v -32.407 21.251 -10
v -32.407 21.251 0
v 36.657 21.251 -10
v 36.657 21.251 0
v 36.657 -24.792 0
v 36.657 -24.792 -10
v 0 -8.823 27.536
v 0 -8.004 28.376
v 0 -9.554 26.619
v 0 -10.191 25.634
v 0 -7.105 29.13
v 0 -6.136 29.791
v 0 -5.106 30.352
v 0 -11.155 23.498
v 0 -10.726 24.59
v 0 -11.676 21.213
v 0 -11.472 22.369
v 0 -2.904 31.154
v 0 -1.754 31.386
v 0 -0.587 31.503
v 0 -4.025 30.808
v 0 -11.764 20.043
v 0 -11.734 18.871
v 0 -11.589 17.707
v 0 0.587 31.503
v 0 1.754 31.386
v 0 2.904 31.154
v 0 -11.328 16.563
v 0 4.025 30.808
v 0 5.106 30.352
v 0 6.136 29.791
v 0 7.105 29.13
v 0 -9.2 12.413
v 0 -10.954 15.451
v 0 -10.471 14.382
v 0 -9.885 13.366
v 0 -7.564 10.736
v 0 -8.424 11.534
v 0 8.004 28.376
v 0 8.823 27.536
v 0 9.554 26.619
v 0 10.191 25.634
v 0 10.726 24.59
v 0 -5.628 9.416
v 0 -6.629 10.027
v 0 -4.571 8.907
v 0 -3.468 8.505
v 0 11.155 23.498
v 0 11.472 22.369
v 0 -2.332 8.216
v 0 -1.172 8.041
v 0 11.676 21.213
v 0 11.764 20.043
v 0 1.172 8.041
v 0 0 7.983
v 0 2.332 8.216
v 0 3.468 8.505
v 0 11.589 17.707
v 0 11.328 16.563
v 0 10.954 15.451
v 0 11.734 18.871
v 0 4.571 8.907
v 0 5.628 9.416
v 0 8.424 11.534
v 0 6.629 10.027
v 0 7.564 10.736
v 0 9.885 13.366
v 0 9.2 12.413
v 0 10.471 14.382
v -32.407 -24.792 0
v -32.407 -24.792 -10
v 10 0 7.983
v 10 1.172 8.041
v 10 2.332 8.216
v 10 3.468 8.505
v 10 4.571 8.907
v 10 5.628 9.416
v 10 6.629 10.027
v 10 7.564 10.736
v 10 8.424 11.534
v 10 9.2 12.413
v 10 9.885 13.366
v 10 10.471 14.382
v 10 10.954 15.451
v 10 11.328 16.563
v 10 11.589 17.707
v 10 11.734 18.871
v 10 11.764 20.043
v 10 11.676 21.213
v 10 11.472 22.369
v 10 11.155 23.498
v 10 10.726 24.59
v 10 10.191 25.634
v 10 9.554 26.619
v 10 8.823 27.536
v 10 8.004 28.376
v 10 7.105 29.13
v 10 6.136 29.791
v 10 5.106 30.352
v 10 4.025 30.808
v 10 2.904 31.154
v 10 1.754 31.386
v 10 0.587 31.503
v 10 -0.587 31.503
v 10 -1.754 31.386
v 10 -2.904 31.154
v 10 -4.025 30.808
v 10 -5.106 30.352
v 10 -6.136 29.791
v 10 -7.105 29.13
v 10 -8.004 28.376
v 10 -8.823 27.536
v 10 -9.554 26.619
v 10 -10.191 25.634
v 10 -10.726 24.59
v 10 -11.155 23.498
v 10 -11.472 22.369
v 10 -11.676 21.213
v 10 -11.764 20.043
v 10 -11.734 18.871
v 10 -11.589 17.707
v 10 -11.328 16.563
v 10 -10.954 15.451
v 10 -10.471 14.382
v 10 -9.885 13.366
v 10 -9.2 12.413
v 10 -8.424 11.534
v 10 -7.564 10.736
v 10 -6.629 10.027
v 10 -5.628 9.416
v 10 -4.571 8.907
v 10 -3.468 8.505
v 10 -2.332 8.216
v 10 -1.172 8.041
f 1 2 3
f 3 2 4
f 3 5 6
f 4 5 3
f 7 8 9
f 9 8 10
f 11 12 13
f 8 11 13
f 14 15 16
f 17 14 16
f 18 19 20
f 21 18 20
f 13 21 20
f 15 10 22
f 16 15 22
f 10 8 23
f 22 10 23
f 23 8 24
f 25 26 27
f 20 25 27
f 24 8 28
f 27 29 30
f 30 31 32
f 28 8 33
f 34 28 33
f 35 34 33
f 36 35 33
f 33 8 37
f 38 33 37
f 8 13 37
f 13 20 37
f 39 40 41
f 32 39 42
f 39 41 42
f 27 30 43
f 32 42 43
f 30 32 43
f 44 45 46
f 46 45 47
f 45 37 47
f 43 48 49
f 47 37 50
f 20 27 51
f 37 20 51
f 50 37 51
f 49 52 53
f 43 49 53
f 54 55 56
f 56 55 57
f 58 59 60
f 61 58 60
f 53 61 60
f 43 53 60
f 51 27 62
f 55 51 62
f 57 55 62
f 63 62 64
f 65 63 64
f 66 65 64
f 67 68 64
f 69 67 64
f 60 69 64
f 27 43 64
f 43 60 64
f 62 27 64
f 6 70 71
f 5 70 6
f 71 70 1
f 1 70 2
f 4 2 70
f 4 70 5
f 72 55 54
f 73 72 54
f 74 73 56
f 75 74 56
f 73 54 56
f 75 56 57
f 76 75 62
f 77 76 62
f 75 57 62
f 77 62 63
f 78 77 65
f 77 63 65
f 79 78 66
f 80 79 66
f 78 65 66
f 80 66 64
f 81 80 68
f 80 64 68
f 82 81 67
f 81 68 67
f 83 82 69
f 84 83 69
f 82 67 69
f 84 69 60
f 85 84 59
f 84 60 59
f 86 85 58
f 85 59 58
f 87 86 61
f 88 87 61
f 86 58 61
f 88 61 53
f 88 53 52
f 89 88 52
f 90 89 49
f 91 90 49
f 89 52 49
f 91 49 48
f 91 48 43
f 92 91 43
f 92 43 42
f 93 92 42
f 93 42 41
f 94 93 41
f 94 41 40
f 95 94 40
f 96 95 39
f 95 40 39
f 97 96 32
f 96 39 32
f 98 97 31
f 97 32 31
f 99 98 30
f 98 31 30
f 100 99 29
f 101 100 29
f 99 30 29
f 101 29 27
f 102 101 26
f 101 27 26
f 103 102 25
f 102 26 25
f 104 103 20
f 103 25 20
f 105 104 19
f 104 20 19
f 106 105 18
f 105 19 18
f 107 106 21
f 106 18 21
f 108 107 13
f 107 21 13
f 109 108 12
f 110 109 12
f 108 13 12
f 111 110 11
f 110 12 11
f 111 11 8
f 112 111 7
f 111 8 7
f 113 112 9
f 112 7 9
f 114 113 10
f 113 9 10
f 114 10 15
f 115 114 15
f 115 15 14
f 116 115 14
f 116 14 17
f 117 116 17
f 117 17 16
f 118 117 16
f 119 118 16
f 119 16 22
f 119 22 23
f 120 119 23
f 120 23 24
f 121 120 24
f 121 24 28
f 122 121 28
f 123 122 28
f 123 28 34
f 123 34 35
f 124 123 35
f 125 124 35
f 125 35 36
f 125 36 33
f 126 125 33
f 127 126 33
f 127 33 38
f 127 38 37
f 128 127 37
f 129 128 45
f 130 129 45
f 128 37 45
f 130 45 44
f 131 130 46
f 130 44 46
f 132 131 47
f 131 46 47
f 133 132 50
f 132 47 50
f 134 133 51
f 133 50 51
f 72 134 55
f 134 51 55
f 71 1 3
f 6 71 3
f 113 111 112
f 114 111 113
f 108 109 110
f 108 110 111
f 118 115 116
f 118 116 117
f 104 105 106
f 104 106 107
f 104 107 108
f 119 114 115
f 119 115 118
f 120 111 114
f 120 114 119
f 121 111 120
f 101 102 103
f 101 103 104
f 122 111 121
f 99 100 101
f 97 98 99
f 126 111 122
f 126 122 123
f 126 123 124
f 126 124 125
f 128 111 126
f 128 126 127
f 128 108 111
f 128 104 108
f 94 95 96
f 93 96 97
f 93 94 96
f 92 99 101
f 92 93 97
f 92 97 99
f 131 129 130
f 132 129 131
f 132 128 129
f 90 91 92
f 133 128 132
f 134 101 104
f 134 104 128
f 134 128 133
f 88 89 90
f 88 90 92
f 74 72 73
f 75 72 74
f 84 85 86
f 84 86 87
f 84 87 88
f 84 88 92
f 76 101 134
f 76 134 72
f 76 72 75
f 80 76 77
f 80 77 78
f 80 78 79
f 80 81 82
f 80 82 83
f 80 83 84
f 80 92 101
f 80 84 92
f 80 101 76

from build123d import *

# Parameters (mm, degrees)
SKETCH_1_W      = 69.064774026
SKETCH_1_H      = 46.043182684
EXTRUDE_1_DEPTH = 10
SKETCH_2_R      = 11.767350743
EXTRUDE_3_DEPTH = 10


with BuildPart() as part:
    # Эскиз1 → Бобышка-Вытянуть1 (new body)
    with BuildSketch(Plane.XY):
        with Locations((2.12506997, -1.770891642)):
            Rectangle(SKETCH_1_W, SKETCH_1_H)
    extrude(amount=-EXTRUDE_1_DEPTH)


with BuildPart() as body_2:
    # Эскиз2 → Бобышка-Вытянуть3 (new body)
    with BuildSketch(Plane(origin=(0, 0, 0), x_dir=(0, 0, -1), z_dir=(1, 0, 0))):
        with Locations((-19.75002894, 0)):
            Circle(SKETCH_2_R)
    extrude(amount=EXTRUDE_3_DEPTH)


solid = Compound([part.part, body_2.part])
